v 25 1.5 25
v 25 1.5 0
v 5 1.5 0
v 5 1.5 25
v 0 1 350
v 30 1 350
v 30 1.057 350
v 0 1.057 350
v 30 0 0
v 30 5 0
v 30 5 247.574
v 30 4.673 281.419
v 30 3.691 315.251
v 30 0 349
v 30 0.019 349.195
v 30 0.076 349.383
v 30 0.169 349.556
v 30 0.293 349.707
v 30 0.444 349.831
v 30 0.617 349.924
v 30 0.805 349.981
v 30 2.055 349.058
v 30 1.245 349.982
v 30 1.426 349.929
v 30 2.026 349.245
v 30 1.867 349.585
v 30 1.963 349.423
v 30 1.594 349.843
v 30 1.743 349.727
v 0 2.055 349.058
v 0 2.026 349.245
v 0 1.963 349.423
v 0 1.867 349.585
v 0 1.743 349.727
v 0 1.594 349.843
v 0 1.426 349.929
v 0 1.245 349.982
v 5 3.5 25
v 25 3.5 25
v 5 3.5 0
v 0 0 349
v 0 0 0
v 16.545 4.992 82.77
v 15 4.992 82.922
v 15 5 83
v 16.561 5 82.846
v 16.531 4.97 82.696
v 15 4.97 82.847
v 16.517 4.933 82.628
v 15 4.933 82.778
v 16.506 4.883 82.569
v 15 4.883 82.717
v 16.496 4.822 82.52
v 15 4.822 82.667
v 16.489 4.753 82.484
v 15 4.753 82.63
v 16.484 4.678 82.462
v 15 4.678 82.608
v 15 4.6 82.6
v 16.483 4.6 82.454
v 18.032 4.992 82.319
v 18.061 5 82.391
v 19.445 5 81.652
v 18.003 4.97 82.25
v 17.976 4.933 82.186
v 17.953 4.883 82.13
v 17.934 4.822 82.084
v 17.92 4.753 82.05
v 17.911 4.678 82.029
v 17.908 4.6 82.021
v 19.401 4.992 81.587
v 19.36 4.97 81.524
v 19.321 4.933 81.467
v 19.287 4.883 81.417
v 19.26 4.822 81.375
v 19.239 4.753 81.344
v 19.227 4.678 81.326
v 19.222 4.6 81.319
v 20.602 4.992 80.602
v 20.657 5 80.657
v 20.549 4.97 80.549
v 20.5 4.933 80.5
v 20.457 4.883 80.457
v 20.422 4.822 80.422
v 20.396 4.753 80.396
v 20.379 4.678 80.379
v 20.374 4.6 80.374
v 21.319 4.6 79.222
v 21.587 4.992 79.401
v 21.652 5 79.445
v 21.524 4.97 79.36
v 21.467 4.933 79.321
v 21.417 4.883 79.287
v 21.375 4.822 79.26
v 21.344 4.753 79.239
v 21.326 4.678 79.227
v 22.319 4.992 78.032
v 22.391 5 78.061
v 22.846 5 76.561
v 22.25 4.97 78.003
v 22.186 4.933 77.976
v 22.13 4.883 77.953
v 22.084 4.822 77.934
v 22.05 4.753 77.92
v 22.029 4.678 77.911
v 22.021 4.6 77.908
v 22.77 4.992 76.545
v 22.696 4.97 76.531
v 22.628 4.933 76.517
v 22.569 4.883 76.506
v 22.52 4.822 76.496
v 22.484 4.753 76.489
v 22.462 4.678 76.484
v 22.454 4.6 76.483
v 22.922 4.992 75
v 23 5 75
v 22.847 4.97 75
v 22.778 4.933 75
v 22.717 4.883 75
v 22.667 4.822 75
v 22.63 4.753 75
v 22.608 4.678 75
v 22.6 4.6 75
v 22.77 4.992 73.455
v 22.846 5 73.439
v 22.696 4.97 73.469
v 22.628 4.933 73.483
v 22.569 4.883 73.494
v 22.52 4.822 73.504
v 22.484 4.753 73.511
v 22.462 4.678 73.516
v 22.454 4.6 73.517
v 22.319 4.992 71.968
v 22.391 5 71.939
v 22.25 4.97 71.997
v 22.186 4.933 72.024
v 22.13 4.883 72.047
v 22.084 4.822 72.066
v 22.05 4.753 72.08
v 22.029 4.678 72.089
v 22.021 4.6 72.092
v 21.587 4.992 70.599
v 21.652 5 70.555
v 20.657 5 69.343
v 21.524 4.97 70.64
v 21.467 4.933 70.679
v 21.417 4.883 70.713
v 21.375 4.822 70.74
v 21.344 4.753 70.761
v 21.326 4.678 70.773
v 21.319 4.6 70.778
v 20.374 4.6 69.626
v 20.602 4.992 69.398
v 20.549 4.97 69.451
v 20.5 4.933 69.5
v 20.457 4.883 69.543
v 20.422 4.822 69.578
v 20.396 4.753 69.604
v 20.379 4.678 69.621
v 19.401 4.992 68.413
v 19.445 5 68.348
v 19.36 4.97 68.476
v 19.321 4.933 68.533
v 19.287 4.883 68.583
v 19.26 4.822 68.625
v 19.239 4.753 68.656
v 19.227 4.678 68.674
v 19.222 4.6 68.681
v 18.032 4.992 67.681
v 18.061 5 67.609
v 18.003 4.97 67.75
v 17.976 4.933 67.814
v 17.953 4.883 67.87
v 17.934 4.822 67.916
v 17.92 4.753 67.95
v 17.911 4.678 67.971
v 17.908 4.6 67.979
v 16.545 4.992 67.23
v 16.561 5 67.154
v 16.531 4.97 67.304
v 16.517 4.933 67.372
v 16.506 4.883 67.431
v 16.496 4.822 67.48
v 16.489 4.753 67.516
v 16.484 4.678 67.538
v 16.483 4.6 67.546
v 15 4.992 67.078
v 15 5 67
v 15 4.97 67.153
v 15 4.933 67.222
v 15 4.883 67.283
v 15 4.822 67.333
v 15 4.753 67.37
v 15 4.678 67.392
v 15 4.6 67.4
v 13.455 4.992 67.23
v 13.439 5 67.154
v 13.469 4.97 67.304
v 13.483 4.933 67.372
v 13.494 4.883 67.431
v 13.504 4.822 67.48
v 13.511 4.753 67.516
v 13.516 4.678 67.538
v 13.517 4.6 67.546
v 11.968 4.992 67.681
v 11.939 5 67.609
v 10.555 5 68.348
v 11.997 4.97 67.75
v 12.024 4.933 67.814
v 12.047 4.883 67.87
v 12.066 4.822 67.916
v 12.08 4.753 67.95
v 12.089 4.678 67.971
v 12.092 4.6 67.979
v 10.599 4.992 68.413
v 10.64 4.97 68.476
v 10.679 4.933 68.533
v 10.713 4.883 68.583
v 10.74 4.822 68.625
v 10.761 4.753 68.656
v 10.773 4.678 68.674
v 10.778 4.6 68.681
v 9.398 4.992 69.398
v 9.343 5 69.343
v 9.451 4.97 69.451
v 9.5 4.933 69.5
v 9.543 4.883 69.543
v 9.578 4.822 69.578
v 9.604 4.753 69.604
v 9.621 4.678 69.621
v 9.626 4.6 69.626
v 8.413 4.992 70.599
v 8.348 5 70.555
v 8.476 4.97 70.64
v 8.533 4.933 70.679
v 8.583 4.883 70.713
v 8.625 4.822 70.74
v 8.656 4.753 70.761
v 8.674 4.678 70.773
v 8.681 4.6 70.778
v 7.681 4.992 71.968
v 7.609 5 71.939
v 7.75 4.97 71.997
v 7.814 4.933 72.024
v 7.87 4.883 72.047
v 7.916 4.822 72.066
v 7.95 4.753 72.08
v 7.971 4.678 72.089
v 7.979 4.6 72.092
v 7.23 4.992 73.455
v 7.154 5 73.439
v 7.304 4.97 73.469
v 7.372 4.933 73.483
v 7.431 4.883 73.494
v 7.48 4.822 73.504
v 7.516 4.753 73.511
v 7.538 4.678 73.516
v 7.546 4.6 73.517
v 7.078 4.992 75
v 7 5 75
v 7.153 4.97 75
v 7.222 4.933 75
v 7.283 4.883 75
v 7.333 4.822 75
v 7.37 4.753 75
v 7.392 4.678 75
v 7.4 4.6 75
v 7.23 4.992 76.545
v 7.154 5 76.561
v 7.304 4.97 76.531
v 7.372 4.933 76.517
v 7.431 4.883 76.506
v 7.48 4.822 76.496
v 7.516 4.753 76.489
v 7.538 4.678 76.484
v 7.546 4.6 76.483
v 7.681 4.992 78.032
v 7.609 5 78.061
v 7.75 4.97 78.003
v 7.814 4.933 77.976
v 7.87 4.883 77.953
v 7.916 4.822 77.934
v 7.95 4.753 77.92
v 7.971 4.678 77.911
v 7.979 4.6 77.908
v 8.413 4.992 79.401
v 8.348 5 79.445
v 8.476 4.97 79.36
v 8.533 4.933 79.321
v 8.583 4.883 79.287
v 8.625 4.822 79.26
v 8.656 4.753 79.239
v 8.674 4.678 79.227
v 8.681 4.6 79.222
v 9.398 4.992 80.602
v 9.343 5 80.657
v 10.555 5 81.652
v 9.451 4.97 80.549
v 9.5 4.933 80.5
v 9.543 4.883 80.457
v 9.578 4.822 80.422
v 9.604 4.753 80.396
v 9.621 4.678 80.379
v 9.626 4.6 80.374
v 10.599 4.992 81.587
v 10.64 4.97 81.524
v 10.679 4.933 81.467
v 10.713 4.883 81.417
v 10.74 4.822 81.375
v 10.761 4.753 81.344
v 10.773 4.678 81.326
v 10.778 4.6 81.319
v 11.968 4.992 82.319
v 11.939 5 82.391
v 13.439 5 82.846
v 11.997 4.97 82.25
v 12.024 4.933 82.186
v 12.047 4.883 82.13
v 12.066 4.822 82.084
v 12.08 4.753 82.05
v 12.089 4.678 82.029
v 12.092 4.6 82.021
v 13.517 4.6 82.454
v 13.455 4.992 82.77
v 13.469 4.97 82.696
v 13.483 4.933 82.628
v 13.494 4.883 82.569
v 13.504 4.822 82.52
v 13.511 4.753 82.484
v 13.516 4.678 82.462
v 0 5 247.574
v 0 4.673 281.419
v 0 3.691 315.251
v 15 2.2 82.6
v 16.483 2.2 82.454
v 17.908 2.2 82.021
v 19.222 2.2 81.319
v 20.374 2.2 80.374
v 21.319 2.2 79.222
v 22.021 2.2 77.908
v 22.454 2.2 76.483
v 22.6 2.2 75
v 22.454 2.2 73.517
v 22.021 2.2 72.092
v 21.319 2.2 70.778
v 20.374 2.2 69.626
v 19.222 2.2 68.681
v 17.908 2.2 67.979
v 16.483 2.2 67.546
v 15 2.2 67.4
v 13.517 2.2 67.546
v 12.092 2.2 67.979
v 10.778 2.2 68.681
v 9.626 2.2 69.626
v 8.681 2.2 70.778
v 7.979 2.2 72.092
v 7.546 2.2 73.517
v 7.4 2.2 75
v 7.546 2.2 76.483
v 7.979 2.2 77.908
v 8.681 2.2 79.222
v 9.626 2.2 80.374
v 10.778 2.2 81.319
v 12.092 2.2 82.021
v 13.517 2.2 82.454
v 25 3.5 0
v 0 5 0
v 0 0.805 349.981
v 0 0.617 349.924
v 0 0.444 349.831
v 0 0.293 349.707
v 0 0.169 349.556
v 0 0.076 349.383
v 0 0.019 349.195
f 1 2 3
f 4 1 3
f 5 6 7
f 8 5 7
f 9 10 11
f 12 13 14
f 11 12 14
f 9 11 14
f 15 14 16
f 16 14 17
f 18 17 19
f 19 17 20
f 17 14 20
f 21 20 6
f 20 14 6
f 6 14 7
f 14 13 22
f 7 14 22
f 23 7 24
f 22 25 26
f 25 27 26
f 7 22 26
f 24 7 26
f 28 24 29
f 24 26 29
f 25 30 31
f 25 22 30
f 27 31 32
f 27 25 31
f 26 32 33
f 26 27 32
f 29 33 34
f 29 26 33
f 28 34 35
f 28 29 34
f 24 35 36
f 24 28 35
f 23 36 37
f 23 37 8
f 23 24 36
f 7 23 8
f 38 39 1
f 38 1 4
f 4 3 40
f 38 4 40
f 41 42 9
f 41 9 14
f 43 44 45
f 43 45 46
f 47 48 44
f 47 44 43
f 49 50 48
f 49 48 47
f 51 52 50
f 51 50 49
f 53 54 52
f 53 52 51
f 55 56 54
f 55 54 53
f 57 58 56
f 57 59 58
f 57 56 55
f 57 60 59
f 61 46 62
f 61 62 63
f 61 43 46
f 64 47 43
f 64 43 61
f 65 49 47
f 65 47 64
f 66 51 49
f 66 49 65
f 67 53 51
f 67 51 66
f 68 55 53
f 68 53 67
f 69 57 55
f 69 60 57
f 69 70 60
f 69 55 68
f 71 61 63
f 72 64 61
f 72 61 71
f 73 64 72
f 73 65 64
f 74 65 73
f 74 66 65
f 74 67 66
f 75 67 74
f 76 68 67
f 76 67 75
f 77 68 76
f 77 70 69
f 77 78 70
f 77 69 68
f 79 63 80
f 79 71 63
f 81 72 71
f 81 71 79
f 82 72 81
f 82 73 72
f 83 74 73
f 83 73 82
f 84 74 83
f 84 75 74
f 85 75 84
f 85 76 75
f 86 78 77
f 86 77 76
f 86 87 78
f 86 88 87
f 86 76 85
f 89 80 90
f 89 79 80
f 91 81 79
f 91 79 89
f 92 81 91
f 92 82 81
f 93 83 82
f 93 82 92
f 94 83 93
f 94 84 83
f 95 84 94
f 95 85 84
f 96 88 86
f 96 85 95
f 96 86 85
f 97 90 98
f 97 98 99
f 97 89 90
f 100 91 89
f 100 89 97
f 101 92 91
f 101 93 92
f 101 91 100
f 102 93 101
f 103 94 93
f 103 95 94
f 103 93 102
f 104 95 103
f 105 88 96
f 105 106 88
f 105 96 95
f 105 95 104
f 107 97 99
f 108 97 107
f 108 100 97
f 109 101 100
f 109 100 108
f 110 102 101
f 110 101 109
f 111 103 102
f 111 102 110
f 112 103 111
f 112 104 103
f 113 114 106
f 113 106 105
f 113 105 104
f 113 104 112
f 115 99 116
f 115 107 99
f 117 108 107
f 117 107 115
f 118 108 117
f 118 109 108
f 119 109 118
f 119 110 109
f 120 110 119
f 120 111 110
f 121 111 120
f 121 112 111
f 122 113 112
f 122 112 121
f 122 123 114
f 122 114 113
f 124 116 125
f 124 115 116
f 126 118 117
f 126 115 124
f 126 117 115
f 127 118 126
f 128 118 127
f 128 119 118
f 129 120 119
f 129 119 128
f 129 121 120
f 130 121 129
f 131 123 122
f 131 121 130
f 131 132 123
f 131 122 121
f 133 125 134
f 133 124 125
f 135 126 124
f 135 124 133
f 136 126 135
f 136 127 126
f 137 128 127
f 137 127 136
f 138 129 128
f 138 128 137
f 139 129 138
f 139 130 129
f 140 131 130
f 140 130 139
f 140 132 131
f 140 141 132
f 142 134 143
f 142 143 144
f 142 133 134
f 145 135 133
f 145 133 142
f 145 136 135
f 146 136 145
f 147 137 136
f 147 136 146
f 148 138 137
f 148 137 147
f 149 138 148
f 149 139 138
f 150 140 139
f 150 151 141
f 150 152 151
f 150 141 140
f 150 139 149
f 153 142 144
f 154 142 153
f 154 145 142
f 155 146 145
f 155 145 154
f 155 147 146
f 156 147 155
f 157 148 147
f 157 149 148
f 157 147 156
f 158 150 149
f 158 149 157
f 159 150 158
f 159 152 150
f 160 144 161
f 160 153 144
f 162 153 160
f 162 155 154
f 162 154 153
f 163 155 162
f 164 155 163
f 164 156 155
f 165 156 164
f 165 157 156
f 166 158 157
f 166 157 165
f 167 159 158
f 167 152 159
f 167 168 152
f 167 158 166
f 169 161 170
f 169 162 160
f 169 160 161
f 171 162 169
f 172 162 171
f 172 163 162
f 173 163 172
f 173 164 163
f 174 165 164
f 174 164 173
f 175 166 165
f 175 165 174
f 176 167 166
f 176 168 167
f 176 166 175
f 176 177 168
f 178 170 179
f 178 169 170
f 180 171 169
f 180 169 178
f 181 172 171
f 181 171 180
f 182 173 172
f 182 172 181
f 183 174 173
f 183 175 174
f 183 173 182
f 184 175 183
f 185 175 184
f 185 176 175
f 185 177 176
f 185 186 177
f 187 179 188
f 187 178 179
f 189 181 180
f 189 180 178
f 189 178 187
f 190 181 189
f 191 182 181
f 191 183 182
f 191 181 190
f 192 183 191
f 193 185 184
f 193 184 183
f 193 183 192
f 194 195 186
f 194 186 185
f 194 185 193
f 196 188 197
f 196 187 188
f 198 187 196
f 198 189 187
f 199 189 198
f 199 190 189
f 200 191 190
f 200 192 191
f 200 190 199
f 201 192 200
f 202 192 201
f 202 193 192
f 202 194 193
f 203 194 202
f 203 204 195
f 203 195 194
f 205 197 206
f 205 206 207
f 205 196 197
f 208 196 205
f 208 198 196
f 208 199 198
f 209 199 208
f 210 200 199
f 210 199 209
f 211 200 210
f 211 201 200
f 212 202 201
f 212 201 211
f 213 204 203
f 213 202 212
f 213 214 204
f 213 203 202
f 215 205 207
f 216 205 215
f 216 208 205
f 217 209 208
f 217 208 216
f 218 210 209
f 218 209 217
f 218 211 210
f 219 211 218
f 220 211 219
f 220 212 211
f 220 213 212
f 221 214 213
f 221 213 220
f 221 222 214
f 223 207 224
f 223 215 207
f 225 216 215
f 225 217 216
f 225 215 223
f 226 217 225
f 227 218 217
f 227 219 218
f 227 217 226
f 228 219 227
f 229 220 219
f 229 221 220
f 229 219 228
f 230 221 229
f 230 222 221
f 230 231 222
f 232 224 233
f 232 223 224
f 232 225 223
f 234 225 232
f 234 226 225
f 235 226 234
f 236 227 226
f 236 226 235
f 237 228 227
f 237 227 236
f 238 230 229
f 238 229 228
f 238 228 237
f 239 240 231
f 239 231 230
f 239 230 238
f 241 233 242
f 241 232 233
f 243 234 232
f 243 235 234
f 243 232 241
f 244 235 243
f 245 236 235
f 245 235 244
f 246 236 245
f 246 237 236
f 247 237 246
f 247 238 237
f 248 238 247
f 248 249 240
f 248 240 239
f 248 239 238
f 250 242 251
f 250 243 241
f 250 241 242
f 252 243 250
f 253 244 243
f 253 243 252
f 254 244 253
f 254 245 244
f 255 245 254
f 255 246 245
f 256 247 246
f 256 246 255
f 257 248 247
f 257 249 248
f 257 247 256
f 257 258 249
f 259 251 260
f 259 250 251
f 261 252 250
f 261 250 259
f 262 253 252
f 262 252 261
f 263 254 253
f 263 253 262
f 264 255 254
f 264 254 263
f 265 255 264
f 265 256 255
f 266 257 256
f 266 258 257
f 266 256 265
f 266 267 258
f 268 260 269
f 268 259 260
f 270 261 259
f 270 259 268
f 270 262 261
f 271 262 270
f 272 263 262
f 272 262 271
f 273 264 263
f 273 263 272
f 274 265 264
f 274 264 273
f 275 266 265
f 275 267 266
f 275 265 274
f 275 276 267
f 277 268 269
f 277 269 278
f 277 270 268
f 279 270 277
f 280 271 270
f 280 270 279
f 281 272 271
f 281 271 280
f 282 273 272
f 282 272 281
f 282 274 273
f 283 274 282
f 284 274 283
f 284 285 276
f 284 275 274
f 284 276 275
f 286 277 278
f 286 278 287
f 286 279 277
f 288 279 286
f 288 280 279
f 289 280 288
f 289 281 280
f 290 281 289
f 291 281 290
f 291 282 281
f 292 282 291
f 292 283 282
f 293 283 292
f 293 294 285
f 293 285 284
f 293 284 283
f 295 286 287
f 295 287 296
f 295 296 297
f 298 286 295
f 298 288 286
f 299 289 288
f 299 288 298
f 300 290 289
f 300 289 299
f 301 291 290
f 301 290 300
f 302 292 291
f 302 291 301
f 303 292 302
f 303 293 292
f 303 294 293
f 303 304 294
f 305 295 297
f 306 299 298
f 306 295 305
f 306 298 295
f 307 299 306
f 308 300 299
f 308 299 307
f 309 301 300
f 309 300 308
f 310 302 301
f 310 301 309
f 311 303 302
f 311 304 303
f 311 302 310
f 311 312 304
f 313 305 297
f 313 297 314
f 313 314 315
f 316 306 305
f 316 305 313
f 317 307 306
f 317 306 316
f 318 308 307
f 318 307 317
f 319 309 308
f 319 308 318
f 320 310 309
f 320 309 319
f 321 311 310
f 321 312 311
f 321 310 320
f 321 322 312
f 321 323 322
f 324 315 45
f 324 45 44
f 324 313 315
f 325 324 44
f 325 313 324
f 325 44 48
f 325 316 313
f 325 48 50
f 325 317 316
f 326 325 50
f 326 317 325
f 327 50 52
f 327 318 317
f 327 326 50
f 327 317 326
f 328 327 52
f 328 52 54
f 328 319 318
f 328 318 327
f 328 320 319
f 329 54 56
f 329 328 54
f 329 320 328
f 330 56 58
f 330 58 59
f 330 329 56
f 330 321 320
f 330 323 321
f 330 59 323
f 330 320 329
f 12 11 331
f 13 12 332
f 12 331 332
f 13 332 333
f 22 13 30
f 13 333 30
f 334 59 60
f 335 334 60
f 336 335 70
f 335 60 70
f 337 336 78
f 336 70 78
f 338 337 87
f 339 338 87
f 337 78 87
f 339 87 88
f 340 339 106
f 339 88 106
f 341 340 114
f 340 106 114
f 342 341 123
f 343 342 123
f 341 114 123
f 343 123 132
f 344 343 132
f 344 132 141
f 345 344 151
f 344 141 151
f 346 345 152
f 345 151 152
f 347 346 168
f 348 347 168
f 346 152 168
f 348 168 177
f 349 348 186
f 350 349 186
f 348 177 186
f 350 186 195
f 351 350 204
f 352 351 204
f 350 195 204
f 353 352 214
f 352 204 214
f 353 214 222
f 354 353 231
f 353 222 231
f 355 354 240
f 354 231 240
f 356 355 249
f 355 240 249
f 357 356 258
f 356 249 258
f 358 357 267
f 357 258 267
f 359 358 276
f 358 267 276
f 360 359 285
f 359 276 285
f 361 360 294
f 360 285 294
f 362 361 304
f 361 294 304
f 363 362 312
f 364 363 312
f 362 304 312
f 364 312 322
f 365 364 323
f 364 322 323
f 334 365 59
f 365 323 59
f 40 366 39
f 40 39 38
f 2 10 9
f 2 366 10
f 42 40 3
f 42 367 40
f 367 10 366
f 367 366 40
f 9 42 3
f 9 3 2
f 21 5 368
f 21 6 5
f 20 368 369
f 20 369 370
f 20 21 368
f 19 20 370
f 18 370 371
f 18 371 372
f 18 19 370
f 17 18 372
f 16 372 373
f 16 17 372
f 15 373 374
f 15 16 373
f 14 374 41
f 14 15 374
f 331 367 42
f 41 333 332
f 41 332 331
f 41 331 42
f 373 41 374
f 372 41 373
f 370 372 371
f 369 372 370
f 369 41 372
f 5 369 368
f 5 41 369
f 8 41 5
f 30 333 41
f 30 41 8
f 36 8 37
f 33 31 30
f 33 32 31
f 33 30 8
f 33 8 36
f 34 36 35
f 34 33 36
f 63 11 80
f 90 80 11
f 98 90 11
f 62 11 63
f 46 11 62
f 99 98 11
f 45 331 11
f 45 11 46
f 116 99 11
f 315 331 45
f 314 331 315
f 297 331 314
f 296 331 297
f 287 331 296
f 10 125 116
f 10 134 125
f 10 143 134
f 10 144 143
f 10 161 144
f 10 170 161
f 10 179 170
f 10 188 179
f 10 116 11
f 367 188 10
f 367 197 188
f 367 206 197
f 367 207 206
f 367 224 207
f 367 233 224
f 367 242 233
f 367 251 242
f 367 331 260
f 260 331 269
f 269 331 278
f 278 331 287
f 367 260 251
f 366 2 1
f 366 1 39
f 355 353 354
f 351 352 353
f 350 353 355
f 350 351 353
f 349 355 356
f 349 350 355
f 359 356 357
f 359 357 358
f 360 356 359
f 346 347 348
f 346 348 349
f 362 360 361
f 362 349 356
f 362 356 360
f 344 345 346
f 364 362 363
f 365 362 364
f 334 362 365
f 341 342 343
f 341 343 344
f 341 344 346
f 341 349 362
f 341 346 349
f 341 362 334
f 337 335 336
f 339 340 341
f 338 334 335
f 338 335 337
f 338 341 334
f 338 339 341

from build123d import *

# Parameters (mm, degrees)
EXTRUDE_1_DEPTH     = 30
FILLET_1_R          = 1750
SKETCH_4_R          = 7.6
CUT_EXTRUDE_3_DEPTH = 2.8
FILLET_4_R          = 0.4
SKETCH_5_W          = 20
SKETCH_5_H          = 2
CUT_EXTRUDE_4_DEPTH = 25
FILLET_5_R          = 1


with BuildPart() as part:
    # 草图1 → 凸台-拉伸1 (new body)
    with BuildSketch(Plane(origin=(0, 0, 0), x_dir=(0, 0, -1), z_dir=(1, 0, 0))):
        Polygon((0, 0), (-350, 0), (-350, 2), (-300, 5), (0, 5), align=None)
    extrude(amount=EXTRUDE_1_DEPTH)

    # 圆角1
    # the kernel refuses this fillet: 1750 mm, written as the material it takes off along each edge
    with BuildSketch(Plane(origin=(-131.063956855, 5, 300), x_dir=(0, -0.05989229072794672, 0.9982048454657786), z_dir=(1, 0, 0))) as fillet_1_piece_1:
        with BuildLine():
            CenterArc((52.480038055, 1749.998367808), FILLET_1_R, 266.566369638, 3.35537678)
            Line((-52.331470719, 3.139888243), (-54.427700895, -31.797281348))
            Line((-54.427700895, -31.797281348), (-2.096230175, -34.937169591))
            Line((-2.096230175, -34.937169591), (0, -35))
            ThreePointArc((0, -35), (25.044959573, -35), (50.042116767, -34.999967356))
            Line((50.042116767, -34.999967356), (50.089919145, 0))
        make_face()
    extrude(amount=292.127913709, mode=Mode.SUBTRACT)

    # 草图4 → 切除-拉伸3 (cut)
    with BuildSketch(Plane(origin=(0, 5, 0), x_dir=(1, 0, 0), z_dir=(0, 1, 0))):
        with Locations(Location((15, -75, 0), (0, 0, 270))):
            Circle(SKETCH_4_R)
    extrude(amount=-CUT_EXTRUDE_3_DEPTH, mode=Mode.SUBTRACT)

    # 圆角4
    fillet_4_edges = [part.edges().sort_by_distance(p)[0] for p in [
        (15, 5, 67.4),
    ]]
    fillet(fillet_4_edges, radius=FILLET_4_R)

    # 草图5 → 切除-拉伸4 (cut)
    with BuildSketch(Plane(origin=(0, 0, 0), x_dir=(-1, 0, 0), z_dir=(0, 0, -1))):
        with Locations((-15, 2.5)):
            Rectangle(SKETCH_5_W, SKETCH_5_H)
    extrude(amount=-CUT_EXTRUDE_4_DEPTH, mode=Mode.SUBTRACT)

    # 圆角5
    fillet_5_edges = [part.edges().sort_by_distance(p)[0] for p in [
        (15, 0, 350),
        (15, 2, 350),
    ]]
    fillet(fillet_5_edges, radius=FILLET_5_R)


solid = part.part
